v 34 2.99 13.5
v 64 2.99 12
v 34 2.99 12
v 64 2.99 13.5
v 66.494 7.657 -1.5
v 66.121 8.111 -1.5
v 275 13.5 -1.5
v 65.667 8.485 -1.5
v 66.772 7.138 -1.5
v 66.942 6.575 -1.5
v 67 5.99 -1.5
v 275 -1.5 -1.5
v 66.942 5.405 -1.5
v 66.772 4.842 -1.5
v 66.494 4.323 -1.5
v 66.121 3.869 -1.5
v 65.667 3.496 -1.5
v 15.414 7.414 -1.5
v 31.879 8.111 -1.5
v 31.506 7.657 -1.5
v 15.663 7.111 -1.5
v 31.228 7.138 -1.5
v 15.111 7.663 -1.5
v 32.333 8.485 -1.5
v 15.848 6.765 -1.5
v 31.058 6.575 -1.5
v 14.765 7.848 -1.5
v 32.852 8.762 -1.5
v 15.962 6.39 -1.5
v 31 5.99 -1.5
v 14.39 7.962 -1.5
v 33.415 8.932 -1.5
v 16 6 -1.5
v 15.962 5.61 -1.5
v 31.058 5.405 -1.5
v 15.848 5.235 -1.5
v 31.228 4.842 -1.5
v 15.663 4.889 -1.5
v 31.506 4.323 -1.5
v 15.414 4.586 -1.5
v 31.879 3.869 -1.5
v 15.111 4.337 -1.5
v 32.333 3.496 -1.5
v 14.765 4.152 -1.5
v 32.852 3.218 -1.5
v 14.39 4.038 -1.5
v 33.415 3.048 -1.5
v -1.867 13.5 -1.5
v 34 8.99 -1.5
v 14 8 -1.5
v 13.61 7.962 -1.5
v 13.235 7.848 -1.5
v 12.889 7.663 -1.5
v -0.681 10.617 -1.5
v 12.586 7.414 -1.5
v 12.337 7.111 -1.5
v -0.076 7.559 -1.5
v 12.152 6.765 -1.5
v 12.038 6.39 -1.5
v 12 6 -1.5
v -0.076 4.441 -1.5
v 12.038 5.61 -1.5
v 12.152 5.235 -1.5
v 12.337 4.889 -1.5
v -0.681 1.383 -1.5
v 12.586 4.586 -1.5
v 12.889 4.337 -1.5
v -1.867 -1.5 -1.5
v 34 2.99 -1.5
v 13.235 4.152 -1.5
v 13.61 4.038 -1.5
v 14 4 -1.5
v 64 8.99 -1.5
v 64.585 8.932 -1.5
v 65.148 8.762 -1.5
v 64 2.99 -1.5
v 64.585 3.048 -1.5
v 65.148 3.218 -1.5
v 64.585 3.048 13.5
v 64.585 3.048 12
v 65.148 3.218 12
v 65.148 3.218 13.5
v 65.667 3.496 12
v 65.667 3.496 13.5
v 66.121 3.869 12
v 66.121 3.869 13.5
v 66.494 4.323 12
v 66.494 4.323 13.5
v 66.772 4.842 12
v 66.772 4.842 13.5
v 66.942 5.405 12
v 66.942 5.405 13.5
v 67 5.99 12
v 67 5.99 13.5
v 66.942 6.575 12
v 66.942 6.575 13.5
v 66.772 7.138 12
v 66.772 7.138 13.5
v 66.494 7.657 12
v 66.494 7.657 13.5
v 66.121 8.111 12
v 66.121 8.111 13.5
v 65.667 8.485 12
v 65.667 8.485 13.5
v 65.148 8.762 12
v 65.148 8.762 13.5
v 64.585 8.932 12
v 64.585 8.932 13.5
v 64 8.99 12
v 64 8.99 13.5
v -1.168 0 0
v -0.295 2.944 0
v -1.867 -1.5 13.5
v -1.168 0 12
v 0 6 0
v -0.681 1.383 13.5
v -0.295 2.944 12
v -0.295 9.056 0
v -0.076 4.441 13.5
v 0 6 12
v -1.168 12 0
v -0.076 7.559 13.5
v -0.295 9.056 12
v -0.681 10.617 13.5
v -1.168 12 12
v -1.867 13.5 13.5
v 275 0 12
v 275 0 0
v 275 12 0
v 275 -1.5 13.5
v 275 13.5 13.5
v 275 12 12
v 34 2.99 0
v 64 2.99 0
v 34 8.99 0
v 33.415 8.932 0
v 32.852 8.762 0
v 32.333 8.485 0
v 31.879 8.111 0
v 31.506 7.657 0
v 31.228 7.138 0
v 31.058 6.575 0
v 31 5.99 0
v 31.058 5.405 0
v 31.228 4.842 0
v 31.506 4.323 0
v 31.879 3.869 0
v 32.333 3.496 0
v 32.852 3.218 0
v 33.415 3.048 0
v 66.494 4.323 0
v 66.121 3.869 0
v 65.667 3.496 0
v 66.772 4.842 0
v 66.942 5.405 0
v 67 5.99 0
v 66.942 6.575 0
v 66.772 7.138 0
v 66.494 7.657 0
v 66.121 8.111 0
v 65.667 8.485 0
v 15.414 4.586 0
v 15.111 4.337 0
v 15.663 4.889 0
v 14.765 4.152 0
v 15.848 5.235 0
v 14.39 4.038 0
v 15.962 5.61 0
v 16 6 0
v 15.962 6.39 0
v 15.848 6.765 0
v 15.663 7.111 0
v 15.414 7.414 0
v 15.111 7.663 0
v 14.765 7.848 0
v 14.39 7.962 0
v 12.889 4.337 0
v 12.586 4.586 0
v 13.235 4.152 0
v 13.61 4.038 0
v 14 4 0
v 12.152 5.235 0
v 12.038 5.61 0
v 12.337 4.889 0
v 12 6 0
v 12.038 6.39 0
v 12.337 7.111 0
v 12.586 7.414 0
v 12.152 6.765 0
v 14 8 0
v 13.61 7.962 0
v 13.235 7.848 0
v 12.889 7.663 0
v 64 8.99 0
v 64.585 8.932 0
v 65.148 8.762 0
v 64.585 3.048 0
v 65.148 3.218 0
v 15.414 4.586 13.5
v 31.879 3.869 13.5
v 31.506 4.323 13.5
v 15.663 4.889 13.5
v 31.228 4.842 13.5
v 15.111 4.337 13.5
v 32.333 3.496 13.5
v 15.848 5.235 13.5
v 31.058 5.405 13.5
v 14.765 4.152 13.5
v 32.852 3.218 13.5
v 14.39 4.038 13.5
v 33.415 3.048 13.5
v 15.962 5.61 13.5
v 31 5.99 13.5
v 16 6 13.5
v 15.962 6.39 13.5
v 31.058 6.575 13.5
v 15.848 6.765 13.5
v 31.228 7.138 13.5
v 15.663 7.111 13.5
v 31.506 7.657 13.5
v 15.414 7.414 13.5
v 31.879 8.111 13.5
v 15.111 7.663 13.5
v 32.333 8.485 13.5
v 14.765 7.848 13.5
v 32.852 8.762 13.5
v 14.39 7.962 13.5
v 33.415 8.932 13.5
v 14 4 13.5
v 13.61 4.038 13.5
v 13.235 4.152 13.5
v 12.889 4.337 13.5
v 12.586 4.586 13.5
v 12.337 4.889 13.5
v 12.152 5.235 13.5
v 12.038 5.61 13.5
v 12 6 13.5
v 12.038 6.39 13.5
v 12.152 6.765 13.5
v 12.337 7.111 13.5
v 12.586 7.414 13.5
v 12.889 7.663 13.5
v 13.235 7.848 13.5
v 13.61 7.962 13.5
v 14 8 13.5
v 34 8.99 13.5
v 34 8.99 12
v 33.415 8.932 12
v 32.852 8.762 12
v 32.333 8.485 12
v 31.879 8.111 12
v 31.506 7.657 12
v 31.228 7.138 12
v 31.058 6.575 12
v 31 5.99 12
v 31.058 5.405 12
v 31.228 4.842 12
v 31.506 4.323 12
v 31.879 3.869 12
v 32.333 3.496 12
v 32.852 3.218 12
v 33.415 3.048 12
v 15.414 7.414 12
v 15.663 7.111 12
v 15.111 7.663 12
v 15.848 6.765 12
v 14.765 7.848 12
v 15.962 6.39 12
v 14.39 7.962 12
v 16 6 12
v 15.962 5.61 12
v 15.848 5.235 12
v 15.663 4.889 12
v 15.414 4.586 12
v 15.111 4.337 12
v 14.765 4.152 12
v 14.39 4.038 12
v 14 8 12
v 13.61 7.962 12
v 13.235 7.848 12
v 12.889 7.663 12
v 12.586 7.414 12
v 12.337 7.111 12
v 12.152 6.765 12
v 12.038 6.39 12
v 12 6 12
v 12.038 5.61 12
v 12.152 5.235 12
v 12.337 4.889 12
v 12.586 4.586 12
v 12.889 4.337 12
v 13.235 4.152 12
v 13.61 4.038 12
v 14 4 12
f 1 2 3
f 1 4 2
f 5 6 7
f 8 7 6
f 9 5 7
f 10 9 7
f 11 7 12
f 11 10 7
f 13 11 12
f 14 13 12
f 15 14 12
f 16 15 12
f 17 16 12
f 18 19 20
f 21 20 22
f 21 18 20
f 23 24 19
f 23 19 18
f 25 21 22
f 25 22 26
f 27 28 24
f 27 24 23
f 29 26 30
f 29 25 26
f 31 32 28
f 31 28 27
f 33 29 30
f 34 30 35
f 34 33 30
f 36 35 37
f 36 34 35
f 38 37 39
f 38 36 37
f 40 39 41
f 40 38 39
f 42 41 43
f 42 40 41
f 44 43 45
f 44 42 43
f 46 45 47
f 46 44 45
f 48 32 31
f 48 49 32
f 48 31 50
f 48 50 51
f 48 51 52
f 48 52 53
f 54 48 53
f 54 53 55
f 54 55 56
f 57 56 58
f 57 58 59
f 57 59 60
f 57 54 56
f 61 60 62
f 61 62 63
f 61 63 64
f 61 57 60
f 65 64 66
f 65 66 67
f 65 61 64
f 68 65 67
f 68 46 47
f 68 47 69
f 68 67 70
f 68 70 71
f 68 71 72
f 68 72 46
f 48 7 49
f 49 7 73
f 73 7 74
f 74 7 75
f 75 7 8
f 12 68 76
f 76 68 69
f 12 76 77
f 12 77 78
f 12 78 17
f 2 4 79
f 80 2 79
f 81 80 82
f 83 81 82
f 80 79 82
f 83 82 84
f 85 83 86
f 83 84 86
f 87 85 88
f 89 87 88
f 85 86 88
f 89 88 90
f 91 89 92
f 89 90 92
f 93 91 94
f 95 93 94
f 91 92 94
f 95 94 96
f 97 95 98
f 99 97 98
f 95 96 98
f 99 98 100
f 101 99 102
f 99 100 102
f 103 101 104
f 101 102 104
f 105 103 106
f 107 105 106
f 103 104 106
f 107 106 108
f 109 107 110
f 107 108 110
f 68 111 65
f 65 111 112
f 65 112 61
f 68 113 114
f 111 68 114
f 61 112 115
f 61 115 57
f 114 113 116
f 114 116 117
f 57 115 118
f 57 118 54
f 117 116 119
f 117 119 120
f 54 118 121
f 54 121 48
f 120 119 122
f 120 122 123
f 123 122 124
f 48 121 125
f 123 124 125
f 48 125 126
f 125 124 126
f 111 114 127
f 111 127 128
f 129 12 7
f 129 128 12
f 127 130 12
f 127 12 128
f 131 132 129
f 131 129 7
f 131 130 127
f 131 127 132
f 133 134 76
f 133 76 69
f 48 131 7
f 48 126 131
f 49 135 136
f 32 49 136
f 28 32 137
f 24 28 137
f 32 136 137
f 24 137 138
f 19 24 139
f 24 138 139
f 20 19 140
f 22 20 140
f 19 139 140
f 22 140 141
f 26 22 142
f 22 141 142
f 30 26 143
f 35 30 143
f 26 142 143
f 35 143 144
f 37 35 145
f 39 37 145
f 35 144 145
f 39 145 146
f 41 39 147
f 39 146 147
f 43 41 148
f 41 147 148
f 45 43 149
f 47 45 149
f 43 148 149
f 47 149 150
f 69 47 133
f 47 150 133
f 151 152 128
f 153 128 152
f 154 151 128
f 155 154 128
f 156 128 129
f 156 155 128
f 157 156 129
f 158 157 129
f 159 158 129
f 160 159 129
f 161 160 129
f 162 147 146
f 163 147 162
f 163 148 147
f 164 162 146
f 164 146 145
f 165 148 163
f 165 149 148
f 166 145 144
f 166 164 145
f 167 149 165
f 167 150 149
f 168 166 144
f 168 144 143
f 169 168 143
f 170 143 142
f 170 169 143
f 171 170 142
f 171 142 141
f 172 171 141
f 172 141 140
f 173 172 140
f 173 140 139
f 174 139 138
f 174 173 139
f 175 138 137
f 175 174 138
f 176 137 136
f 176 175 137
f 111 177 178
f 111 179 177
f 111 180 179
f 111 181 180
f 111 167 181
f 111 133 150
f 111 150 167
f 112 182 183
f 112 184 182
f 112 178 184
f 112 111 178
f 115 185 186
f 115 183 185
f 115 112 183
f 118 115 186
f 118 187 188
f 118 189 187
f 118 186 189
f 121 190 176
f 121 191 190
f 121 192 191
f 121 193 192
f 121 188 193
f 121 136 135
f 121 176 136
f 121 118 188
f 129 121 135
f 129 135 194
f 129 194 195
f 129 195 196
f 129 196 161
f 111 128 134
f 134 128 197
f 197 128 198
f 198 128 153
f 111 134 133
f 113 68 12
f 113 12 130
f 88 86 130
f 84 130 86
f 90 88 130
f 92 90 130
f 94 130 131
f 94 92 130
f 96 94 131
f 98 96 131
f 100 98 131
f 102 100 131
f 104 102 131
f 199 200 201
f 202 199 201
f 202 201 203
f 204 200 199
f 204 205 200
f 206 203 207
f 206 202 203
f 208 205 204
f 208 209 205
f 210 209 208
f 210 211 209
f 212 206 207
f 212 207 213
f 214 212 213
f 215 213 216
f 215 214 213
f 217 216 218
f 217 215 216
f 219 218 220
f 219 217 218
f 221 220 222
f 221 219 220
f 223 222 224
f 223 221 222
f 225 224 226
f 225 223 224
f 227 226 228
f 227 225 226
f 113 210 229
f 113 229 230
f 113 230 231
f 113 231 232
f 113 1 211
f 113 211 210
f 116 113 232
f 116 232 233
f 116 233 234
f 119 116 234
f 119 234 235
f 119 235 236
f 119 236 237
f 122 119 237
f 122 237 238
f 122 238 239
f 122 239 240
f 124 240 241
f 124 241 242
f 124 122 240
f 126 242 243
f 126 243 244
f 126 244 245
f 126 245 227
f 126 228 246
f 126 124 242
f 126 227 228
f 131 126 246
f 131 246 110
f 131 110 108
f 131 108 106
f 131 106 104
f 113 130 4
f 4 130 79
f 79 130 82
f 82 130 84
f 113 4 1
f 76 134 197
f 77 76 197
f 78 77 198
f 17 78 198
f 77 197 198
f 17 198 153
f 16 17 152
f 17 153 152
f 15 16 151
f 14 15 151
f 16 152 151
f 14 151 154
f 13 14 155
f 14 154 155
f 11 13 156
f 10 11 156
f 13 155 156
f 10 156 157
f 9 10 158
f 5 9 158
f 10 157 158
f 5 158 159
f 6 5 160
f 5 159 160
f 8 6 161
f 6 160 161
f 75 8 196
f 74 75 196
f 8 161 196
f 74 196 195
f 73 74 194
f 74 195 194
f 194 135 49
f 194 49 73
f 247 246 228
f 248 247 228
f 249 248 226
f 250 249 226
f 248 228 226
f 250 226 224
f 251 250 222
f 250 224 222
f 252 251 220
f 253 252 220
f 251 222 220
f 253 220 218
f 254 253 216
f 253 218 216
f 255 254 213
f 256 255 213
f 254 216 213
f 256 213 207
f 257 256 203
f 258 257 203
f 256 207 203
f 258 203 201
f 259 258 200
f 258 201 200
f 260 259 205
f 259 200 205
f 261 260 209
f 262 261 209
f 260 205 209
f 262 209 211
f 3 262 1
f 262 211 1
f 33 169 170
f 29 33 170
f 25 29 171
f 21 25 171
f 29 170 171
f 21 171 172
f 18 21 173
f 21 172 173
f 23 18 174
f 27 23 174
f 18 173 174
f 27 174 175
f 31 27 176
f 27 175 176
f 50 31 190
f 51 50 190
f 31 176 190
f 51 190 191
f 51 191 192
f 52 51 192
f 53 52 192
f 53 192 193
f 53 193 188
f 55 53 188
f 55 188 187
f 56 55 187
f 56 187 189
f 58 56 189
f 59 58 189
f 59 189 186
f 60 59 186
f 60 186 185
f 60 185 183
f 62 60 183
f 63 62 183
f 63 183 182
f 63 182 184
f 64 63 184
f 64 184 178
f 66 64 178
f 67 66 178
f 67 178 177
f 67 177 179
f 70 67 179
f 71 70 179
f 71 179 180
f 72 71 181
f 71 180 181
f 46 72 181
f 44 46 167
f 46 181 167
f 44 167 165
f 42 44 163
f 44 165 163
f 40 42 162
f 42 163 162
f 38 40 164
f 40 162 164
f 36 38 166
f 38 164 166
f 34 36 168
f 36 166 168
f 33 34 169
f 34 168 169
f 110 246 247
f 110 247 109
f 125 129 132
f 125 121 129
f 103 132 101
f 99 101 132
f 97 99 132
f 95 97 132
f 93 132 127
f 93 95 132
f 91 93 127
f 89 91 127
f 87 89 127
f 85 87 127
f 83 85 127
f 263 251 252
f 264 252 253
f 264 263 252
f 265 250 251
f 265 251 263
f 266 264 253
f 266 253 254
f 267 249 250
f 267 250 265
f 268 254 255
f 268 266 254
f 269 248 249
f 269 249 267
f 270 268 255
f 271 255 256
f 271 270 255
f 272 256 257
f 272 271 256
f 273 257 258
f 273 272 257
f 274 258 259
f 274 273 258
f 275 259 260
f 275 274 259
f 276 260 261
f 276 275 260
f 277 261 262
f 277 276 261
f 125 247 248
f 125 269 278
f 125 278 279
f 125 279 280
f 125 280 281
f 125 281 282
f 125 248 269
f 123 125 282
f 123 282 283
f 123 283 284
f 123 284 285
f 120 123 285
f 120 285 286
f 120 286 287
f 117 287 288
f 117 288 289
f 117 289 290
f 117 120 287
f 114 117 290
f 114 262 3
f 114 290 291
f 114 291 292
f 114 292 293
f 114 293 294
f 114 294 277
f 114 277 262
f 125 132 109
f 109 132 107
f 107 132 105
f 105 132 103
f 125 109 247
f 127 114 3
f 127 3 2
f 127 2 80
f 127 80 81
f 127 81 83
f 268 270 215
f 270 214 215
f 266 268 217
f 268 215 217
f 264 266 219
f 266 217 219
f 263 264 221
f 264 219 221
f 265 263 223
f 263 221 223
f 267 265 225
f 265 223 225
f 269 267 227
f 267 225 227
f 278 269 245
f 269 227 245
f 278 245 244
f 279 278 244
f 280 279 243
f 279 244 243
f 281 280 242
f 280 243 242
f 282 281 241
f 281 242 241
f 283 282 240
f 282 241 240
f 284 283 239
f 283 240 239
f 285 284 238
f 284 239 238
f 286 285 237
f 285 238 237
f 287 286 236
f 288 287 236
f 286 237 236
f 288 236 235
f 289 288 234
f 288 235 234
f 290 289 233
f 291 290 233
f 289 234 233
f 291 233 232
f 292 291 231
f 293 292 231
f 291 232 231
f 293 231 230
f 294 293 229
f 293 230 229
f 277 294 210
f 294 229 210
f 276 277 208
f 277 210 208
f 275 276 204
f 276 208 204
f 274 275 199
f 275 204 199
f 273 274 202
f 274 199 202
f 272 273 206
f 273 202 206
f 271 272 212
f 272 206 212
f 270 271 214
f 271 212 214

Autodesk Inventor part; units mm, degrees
ref_plane "YZ Plane" through (0, 0, 0) normal (1, 0, 0) x (0, 1, 0)
ref_plane "XZ Plane" through (0, 0, 0) normal (0, 1, 0) x (-1, 0, 0)
ref_plane "XY Plane" through (0, 0, 0) normal (0, 0, 1) x (1, 0, 0)
sketch "Sketch1" plane through (0, 0, 0) normal (1, 0, 0) x (0, 1, 0)
  line L0 (0, 0) -> (12, 0)
  line L1 (12, 0) -> (12, 12)
  line L2 (12, 12) -> (0, 12)
  line L3 (0, 12) -> (0, 0)
  line L4 (-1.5, 13.5) -> (13.5, 13.5)
  line L5 (13.5, 13.5) -> (13.5, -1.5)
  line L6 (13.5, -1.5) -> (-1.5, -1.5)
  line L7 (-1.5, -1.5) -> (-1.5, 13.5)
  dimension "FalVastagsag" = 1.5
  dimension "BelsoAtmero" = 12
  dimension "d2" = 12
extrude "Extrusion1" add sketch "Sketch1" along normal blind 275 and the other way blind 15
sketch "Sketch2" plane through (0, -1.5, 13.5) normal (0, 0, 1) x (1, 0, 0)
  line L0 (0, 0) -> (0, 15) projected
  line L1 (0, 0) -> (275, 0) projected
  circle A0 centre (-16, 7.5) radius 16
  circle A1 centre (-16, 7.5) radius 30
  circle A2 centre (14, 7.5) radius 2
  point P0 (0, 1.5)
  dimension "d22" = 60
  dimension "d8" = 32
  dimension "d9" = 16
  dimension "d23" = 4
sketch "Sketch4" plane through (0, 0, 0) normal (-1, 0, 0) x (0, 0, 1)
  line L0 (0, 0) -> (12, 0)
  line L1 (12, 0) -> (12, 12)
  line L2 (12, 12) -> (0, 12)
  line L3 (0, 12) -> (0, 0)
  line L4 (-1.5, -1.5) -> (13.5, -1.5)
  line L5 (13.5, -1.5) -> (13.5, 13.5)
  line L6 (13.5, 13.5) -> (-1.5, 13.5)
  line L7 (-1.5, 13.5) -> (-1.5, -1.5)
extrude "Extrusion2" add sketch "Sketch4" along normal blind 10
extrude "Extrusion3" cut sketch "Sketch2" against normal through all contours A0
sketch "Sketch5" plane through (-16, 6, 13.5) normal (0, 0, 1) x (1, 0, 0)
  arc A0 (50, 2.9901) -> (50, -3.0099) centre (50, -0.0099) ccw
  arc A1 (80, -3.0099) -> (80, 2.9901) centre (80, -0.0099) ccw
  line L0 (50, 2.9901) -> (80, 2.9901)
  line L1 (80, -3.0099) -> (50, -3.0099)
  arc A2 (14.1333, -7.5) -> (14.1333, 7.5) centre (0, 0) ccw projected
  point P0 (16, -6)
  dimension "d16" = 6
  dimension "d17" = 6
  dimension "d18" = 30
  dimension "d19" = 50
extrude "Extrusion4" cut sketch "Sketch5" against normal through all
extrude "Extrusion5" cut sketch "Sketch2" against normal through all contours A2 A1 | A1 A2 picked at (14.5954, 6.9828) picked at (13.3724, 7.0462)
mirror "Mirror2" [suppressed]
equation "\"FalVastagsag\" = ZártSzelvényFalVastagság"
equation "\"BelsoAtmero\" = ZártSzelvényBelsőÁtmérő"
equation "\"d2\" = ZártSzelvényBelsőÁtmérő"
equation "\"d22\" = 2 * PorvedoRogzitesJatekSugara"
equation "\"d8\" = CsapágyHázKülsőÁtmérő"
equation "\"d9\" = 0.5 * CsapágyHázKülsőÁtmérő"
equation "\"ZártSzelvényFalVastagság\" = 1.5"
equation "\"ZártSzelvényBelsőÁtmérő\" = 12"
equation "\"CsapágyHázKülsőÁtmérő\" = 32"
equation "\"ZártSzelvényKülsőÁtmérő\" = 15"
equation "\"CsapágyBelsőÁtmérő\" = 12"
equation "\"CsapágyKülsőÁtmérő\" = 28"
equation "\"CsapágyHázBelsőÁtmérő\" = 26"
equation "\"CTipHoszza\" = 400"
equation "\"ATipHoszza\" = 400"
equation "\"BTipHoszza\" = 70"
equation "\"CsapágyHázHoszza\" = 45"
equation "\"CsapágySzélesége\" = 8"
equation "\"PorvedoRogzitesJatekSugara\" = 30"
properties part number "KétvégenMartSzelvény" material "Acetal Resin, Black"
